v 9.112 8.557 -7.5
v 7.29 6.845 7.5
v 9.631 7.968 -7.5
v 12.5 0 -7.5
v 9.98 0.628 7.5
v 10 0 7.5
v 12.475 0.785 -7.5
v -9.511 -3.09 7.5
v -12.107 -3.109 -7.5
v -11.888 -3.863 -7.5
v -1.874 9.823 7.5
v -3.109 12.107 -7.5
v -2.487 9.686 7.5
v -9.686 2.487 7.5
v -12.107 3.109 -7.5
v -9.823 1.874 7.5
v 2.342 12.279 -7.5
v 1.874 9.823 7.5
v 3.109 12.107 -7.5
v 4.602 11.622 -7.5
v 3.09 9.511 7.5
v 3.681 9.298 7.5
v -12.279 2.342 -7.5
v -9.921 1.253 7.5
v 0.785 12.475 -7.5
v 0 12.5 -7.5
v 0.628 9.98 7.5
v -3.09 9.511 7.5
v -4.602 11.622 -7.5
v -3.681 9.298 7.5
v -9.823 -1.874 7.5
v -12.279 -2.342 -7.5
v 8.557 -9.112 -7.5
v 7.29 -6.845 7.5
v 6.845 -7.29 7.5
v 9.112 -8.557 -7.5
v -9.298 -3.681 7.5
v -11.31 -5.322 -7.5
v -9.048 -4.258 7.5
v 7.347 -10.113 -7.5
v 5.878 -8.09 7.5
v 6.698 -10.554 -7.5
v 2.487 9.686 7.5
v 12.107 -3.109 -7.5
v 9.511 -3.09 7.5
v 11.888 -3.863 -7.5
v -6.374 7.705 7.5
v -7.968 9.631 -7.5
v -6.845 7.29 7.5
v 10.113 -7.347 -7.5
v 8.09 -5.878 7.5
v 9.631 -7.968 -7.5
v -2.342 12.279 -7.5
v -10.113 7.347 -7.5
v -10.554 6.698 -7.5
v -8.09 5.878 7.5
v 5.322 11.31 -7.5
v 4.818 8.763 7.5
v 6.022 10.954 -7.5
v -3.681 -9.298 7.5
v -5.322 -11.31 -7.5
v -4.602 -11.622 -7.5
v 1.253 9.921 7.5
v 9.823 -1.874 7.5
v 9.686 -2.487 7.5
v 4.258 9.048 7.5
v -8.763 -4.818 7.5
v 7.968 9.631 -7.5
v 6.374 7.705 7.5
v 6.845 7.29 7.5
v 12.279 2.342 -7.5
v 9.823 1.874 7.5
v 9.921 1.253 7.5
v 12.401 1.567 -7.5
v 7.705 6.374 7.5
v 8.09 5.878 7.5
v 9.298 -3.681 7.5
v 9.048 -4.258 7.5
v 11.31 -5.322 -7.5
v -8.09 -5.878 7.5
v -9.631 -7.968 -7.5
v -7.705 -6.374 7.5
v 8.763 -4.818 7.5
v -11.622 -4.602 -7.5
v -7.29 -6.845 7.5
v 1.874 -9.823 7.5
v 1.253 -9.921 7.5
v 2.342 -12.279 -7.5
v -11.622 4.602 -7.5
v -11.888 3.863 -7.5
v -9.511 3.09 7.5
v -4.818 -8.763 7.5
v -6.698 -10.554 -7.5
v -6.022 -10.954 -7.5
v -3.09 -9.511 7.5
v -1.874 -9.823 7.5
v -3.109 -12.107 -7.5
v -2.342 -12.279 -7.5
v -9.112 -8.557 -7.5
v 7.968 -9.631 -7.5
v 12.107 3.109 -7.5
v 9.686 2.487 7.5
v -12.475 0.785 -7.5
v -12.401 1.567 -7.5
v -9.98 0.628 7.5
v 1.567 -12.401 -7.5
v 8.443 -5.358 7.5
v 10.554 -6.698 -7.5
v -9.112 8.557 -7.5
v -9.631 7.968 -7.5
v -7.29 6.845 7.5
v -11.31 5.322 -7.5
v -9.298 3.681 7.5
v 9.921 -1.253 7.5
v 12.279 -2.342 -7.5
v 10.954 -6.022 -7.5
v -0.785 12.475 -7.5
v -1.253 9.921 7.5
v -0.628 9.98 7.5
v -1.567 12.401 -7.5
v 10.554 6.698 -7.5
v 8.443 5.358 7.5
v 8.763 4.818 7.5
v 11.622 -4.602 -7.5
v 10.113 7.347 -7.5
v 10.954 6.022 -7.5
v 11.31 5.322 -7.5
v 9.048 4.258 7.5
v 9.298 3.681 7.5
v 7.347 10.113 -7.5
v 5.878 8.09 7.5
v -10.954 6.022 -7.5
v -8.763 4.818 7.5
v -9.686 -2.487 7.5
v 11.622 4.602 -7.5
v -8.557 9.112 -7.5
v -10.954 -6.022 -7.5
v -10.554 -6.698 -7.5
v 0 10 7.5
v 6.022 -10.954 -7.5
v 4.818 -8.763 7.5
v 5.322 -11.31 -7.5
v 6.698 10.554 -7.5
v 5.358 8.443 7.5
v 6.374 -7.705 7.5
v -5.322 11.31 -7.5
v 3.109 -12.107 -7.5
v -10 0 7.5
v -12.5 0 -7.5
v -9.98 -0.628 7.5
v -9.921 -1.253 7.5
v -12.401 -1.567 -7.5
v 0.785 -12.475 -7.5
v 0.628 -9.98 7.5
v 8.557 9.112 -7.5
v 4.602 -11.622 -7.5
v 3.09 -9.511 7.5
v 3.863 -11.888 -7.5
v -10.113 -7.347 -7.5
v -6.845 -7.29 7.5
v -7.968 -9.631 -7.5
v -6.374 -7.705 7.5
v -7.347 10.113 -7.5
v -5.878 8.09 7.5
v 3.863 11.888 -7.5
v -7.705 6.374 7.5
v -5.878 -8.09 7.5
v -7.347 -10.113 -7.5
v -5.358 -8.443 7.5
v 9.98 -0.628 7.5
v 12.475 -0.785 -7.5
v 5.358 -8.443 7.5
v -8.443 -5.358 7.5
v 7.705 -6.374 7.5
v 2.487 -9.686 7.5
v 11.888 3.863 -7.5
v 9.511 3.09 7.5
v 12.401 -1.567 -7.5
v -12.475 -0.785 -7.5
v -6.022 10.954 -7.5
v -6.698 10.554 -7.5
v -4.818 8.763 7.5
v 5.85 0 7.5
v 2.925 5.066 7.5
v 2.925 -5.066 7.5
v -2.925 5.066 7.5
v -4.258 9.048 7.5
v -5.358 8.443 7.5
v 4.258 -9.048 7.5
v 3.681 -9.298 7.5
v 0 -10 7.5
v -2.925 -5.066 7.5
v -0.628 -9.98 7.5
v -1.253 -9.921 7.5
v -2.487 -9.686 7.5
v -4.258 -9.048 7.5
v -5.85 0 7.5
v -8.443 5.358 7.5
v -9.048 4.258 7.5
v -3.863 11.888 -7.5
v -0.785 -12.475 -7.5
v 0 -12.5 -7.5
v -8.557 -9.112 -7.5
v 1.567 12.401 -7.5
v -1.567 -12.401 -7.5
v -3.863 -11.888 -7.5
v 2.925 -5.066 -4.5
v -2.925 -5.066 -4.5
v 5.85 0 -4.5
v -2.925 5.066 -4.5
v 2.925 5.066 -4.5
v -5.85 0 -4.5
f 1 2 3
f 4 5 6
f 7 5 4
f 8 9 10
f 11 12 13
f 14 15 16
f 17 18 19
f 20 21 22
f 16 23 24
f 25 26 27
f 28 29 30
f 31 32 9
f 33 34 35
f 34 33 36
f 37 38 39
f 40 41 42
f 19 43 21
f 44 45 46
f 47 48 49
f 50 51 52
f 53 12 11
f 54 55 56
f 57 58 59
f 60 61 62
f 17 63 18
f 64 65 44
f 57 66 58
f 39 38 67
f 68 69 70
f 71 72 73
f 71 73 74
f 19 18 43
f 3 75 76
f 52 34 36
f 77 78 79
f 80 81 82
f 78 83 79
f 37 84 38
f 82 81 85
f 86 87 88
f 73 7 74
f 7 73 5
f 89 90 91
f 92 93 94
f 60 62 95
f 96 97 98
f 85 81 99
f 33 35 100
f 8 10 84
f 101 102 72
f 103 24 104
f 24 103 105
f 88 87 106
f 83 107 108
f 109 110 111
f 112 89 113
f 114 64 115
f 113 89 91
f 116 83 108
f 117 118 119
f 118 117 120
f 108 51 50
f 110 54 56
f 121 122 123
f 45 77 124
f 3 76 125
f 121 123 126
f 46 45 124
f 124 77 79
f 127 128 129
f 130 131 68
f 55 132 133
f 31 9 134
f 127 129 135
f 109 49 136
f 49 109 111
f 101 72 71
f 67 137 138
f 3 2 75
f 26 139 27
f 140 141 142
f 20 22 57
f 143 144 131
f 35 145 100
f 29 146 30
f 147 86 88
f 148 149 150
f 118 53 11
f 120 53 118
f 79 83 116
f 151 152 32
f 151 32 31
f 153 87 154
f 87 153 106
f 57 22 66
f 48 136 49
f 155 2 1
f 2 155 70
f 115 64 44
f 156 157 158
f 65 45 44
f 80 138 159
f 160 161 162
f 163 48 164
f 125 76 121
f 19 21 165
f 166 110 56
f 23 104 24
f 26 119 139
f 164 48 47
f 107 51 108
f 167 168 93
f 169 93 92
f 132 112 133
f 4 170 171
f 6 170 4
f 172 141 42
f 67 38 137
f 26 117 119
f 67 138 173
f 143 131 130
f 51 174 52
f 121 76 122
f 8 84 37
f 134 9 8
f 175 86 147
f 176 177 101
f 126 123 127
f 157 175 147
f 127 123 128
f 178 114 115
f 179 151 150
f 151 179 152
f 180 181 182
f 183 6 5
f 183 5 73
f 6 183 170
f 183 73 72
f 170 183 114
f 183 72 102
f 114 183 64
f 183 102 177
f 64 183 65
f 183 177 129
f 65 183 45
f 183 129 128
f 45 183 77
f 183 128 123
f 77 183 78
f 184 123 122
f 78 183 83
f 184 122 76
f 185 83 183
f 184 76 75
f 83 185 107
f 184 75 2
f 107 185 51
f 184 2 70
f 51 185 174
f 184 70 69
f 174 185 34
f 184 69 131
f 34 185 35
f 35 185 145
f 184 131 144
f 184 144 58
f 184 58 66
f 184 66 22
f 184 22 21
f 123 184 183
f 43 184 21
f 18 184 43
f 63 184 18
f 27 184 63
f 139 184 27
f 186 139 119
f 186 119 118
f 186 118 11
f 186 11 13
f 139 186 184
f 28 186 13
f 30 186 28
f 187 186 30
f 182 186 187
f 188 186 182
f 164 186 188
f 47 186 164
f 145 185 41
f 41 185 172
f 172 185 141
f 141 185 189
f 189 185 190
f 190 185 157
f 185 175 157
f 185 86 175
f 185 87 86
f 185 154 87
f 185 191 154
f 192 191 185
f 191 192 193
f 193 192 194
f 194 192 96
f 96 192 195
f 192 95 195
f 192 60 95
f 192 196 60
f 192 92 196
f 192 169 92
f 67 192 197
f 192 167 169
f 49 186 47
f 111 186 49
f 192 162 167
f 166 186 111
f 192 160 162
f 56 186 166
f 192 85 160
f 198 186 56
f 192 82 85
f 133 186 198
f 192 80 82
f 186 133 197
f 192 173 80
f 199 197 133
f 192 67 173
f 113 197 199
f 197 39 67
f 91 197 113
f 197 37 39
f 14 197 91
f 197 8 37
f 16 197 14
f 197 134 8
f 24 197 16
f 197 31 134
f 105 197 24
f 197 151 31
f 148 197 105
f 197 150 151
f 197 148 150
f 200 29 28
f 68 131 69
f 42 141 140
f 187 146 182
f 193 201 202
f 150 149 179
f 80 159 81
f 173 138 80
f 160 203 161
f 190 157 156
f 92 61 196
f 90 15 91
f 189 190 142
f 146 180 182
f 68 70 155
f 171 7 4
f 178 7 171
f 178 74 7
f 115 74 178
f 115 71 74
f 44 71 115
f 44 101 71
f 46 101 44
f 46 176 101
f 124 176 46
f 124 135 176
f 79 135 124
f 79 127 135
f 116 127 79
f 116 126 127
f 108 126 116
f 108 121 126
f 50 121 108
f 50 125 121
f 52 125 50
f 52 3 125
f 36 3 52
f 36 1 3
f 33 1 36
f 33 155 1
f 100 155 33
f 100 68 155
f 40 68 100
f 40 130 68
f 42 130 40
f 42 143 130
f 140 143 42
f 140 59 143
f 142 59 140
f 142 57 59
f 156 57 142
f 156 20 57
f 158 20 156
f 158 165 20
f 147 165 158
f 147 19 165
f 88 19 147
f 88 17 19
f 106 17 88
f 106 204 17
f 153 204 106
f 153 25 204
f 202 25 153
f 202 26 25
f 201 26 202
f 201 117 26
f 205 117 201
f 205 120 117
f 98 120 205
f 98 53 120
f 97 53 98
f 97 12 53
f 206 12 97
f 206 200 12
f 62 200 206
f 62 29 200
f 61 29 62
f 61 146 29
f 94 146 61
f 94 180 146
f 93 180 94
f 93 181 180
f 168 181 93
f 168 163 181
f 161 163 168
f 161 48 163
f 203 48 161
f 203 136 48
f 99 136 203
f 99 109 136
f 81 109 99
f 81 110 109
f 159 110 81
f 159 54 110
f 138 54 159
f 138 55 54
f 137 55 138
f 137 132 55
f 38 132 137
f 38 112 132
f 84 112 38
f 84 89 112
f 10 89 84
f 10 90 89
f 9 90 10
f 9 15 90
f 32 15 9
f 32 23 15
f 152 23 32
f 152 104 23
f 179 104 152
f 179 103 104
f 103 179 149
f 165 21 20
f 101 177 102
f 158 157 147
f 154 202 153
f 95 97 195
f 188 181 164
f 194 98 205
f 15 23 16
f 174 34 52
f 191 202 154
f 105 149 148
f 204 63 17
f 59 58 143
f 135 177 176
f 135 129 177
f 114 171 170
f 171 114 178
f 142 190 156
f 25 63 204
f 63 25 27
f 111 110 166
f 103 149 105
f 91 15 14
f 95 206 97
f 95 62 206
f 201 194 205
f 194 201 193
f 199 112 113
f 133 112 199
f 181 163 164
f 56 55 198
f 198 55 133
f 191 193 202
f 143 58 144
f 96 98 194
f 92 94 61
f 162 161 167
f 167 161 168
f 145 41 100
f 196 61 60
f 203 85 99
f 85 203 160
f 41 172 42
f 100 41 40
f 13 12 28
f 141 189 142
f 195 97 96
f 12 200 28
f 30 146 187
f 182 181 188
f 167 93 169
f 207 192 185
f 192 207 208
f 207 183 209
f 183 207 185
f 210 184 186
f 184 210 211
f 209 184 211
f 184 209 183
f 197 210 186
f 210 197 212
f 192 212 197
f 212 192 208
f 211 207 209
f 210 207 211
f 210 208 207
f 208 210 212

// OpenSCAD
// file: config.scad
$fn=20;

aluminium_extrusion_size = 20.4;
aluminium_extrusion_length = 650;



material_on_rod_length = 40; // the length of material wrapping the rods
material_thickness = 4;

screw_diameter = 3;

screw_diameter_m6 = 6;
nut_diameter_m6 = 11.7;
nut_height_m6 = 5;

reinforcement_3D_size = 15;
reinforcement_2D_size = 15;
reinforcement_2D_unsharp_size = 30;

base_unsharp_size = 10;


// do not touch
screw_height = 100;
reinforcement_3D_margin = 1;
reinforcement_2D_margin = 1;
base_unsharp_margin = 1;


// computed

base_cube_size = aluminium_extrusion_size + material_on_rod_length + material_thickness;
base_cube_offset = (base_cube_size / 2) - (aluminium_extrusion_size / 2) - material_thickness;


module screw() {
    cylinder(r=(screw_diameter / 2), h=screw_height , center=true);
}
// screw

module rod() {
    color([0.7, 0.7, 0.7, 1])
		cube([aluminium_extrusion_size, aluminium_extrusion_length,aluminium_extrusion_size], center=true);
}
// rod

module positioned_aluminium_extrusion_rod_screw_holder(rel_pos, rotation) {
	
	base_border = (aluminium_extrusion_size / 2) + material_on_rod_length;
	
	rotate([0, 90 * rotation, 0])
	translate([0, base_border + rel_pos, 0])
	screw();
}
// positioned_aluminium_extrusion_rod_screw_holder

module positioned_aluminium_extrusion_rod() {
	
	delta = (aluminium_extrusion_length / 2) + (aluminium_extrusion_size / 2) + 1;
	
	translate([0, delta, 0])
	rod();
	
	
	base_border = (aluminium_extrusion_size / 2) + material_on_rod_length;
	
	color([1, 0, 0, 0.7])
	union() {
		positioned_aluminium_extrusion_rod_screw_holder(-10, 0);
		positioned_aluminium_extrusion_rod_screw_holder(-(material_on_rod_length - 10), 0);
		positioned_aluminium_extrusion_rod_screw_holder(-10, 1);
		positioned_aluminium_extrusion_rod_screw_holder(-(material_on_rod_length - 10), 1);
	}
}
//positioned_aluminium_extrusion_rod


module reinforcement_3D() {
	reinforcement_3D_points = [
		[0, 0, 0],
		[reinforcement_3D_size + reinforcement_3D_margin, 0, 0],
		[0, reinforcement_3D_size + reinforcement_3D_margin, 0],
		[0, 0, reinforcement_3D_size + reinforcement_3D_margin],
	];
  
	reinforcement_3D_faces = [
		[0, 1, 2], // x, y plan
		[0, 2, 3], // y, z plan
		[0, 3, 1], // x, z plan
		[1, 3, 2]
	]; 
  
	polyhedron(reinforcement_3D_points, reinforcement_3D_faces);
}
// reinforcement_3D

module reinforcement_2D() {
	reinforcement_2D_width = aluminium_extrusion_size + reinforcement_2D_margin;
	translate([0, 0, -(reinforcement_2D_width / 2)])
    linear_extrude(height=reinforcement_2D_width)
    polygon([
        [0, 0],
        [reinforcement_2D_size + reinforcement_2D_margin, 0],
        [0, reinforcement_2D_size + reinforcement_2D_margin]
    ]);
}
//reinforcement_2D


module base_cube_remove_inner_2D_corner() {
	base_cube_remove_inner_2D_corner_size = material_on_rod_length * 1;
	
	base_cube_remove_inner_2D_corner_offset = (base_cube_remove_inner_2D_corner_size / 2) + (aluminium_extrusion_size / 2) + material_thickness;
	
	reinforcement_2D_offset = (aluminium_extrusion_size / 2) + material_thickness - (reinforcement_2D_margin / 2);
	
	
	base_cube_remove_inner_2D_corner_unsharp_length = aluminium_extrusion_size + (material_thickness * 2) + 1;
	
	base_cube_remove_inner_2D_corner_unsharp_size = reinforcement_2D_unsharp_size * sqrt(2);
	
	base_cube_remove_inner_2D_corner_unsharp_offset = (aluminium_extrusion_size / 2) + material_on_rod_length;
	
	screw_offset = (reinforcement_2D_size + ((material_on_rod_length - material_thickness) * 2 - reinforcement_2D_unsharp_size)) / 4
	+ (aluminium_extrusion_size / 2) + material_thickness;
	
	color([1, 0, 0, 0.7])
	union() {
		difference() {
			translate([0, base_cube_remove_inner_2D_corner_offset, base_cube_remove_inner_2D_corner_offset])
			cube([aluminium_extrusion_size, base_cube_remove_inner_2D_corner_size, base_cube_remove_inner_2D_corner_size], center=true);
			
			translate([0, reinforcement_2D_offset, 		reinforcement_2D_offset])
			rotate([0, -90, 0])
			reinforcement_2D();
		}
		
		
		translate([0, base_cube_remove_inner_2D_corner_unsharp_offset, 		base_cube_remove_inner_2D_corner_unsharp_offset])
		rotate([45, 0, 0])
		cube([base_cube_remove_inner_2D_corner_unsharp_length, base_cube_remove_inner_2D_corner_unsharp_size, base_cube_remove_inner_2D_corner_unsharp_size], center=true);
	
		translate([0, screw_offset, screw_offset])
		rotate([0, 90, 0])
		screw();
	}
}
// base_cube_remove_inner_2D_corner

//base_cube_remove_inner_2D_corner();

module _calibration_screw_m6_test() {
	
	_calibration_rod_test_thickness = 2;
	_calibration_rod_test_size = nut_diameter_m6 + (_calibration_rod_test_thickness * 2);
	
	difference() {
		
		cube([_calibration_rod_test_size, _calibration_rod_test_size, 4], center=true);
		
		cylinder(r=(nut_diameter_m6 / 2), h=50 , $fn=6, center=true);
	}
}
// _calibration_screw_m6_test


module _calibration_rod_test() {
	
	_calibration_screw_test_thickness = 2;
	_calibration_screw_test_size = aluminium_extrusion_size + (_calibration_screw_test_thickness * 2);
	
	difference() {
		
		cube([_calibration_screw_test_size, _calibration_screw_test_size, 4], center=true);
		
		cube([aluminium_extrusion_size, aluminium_extrusion_size, aluminium_extrusion_length], center=true);
	}
}
// _calibration_rod_test
//_calibration_rod_test();
//_calibration_screw_m6_test();
// main file
$fn=20;

include <./config.scad>

base_z = 15;
nut_z = base_z - 3;

module foot_base() {
	difference() {
		color([1, 1, 0, 0.7])
		cylinder(h = base_z, r1 = (25 / 2), r2 = (20 / 2), $fn=100, center = true);
		
		translate([0, 0, (base_z / 2)])
		cylinder(r=(nut_diameter_m6 / 2), h=(nut_z * 2) , $fn=6, center=true);
	}
}

foot_base();
